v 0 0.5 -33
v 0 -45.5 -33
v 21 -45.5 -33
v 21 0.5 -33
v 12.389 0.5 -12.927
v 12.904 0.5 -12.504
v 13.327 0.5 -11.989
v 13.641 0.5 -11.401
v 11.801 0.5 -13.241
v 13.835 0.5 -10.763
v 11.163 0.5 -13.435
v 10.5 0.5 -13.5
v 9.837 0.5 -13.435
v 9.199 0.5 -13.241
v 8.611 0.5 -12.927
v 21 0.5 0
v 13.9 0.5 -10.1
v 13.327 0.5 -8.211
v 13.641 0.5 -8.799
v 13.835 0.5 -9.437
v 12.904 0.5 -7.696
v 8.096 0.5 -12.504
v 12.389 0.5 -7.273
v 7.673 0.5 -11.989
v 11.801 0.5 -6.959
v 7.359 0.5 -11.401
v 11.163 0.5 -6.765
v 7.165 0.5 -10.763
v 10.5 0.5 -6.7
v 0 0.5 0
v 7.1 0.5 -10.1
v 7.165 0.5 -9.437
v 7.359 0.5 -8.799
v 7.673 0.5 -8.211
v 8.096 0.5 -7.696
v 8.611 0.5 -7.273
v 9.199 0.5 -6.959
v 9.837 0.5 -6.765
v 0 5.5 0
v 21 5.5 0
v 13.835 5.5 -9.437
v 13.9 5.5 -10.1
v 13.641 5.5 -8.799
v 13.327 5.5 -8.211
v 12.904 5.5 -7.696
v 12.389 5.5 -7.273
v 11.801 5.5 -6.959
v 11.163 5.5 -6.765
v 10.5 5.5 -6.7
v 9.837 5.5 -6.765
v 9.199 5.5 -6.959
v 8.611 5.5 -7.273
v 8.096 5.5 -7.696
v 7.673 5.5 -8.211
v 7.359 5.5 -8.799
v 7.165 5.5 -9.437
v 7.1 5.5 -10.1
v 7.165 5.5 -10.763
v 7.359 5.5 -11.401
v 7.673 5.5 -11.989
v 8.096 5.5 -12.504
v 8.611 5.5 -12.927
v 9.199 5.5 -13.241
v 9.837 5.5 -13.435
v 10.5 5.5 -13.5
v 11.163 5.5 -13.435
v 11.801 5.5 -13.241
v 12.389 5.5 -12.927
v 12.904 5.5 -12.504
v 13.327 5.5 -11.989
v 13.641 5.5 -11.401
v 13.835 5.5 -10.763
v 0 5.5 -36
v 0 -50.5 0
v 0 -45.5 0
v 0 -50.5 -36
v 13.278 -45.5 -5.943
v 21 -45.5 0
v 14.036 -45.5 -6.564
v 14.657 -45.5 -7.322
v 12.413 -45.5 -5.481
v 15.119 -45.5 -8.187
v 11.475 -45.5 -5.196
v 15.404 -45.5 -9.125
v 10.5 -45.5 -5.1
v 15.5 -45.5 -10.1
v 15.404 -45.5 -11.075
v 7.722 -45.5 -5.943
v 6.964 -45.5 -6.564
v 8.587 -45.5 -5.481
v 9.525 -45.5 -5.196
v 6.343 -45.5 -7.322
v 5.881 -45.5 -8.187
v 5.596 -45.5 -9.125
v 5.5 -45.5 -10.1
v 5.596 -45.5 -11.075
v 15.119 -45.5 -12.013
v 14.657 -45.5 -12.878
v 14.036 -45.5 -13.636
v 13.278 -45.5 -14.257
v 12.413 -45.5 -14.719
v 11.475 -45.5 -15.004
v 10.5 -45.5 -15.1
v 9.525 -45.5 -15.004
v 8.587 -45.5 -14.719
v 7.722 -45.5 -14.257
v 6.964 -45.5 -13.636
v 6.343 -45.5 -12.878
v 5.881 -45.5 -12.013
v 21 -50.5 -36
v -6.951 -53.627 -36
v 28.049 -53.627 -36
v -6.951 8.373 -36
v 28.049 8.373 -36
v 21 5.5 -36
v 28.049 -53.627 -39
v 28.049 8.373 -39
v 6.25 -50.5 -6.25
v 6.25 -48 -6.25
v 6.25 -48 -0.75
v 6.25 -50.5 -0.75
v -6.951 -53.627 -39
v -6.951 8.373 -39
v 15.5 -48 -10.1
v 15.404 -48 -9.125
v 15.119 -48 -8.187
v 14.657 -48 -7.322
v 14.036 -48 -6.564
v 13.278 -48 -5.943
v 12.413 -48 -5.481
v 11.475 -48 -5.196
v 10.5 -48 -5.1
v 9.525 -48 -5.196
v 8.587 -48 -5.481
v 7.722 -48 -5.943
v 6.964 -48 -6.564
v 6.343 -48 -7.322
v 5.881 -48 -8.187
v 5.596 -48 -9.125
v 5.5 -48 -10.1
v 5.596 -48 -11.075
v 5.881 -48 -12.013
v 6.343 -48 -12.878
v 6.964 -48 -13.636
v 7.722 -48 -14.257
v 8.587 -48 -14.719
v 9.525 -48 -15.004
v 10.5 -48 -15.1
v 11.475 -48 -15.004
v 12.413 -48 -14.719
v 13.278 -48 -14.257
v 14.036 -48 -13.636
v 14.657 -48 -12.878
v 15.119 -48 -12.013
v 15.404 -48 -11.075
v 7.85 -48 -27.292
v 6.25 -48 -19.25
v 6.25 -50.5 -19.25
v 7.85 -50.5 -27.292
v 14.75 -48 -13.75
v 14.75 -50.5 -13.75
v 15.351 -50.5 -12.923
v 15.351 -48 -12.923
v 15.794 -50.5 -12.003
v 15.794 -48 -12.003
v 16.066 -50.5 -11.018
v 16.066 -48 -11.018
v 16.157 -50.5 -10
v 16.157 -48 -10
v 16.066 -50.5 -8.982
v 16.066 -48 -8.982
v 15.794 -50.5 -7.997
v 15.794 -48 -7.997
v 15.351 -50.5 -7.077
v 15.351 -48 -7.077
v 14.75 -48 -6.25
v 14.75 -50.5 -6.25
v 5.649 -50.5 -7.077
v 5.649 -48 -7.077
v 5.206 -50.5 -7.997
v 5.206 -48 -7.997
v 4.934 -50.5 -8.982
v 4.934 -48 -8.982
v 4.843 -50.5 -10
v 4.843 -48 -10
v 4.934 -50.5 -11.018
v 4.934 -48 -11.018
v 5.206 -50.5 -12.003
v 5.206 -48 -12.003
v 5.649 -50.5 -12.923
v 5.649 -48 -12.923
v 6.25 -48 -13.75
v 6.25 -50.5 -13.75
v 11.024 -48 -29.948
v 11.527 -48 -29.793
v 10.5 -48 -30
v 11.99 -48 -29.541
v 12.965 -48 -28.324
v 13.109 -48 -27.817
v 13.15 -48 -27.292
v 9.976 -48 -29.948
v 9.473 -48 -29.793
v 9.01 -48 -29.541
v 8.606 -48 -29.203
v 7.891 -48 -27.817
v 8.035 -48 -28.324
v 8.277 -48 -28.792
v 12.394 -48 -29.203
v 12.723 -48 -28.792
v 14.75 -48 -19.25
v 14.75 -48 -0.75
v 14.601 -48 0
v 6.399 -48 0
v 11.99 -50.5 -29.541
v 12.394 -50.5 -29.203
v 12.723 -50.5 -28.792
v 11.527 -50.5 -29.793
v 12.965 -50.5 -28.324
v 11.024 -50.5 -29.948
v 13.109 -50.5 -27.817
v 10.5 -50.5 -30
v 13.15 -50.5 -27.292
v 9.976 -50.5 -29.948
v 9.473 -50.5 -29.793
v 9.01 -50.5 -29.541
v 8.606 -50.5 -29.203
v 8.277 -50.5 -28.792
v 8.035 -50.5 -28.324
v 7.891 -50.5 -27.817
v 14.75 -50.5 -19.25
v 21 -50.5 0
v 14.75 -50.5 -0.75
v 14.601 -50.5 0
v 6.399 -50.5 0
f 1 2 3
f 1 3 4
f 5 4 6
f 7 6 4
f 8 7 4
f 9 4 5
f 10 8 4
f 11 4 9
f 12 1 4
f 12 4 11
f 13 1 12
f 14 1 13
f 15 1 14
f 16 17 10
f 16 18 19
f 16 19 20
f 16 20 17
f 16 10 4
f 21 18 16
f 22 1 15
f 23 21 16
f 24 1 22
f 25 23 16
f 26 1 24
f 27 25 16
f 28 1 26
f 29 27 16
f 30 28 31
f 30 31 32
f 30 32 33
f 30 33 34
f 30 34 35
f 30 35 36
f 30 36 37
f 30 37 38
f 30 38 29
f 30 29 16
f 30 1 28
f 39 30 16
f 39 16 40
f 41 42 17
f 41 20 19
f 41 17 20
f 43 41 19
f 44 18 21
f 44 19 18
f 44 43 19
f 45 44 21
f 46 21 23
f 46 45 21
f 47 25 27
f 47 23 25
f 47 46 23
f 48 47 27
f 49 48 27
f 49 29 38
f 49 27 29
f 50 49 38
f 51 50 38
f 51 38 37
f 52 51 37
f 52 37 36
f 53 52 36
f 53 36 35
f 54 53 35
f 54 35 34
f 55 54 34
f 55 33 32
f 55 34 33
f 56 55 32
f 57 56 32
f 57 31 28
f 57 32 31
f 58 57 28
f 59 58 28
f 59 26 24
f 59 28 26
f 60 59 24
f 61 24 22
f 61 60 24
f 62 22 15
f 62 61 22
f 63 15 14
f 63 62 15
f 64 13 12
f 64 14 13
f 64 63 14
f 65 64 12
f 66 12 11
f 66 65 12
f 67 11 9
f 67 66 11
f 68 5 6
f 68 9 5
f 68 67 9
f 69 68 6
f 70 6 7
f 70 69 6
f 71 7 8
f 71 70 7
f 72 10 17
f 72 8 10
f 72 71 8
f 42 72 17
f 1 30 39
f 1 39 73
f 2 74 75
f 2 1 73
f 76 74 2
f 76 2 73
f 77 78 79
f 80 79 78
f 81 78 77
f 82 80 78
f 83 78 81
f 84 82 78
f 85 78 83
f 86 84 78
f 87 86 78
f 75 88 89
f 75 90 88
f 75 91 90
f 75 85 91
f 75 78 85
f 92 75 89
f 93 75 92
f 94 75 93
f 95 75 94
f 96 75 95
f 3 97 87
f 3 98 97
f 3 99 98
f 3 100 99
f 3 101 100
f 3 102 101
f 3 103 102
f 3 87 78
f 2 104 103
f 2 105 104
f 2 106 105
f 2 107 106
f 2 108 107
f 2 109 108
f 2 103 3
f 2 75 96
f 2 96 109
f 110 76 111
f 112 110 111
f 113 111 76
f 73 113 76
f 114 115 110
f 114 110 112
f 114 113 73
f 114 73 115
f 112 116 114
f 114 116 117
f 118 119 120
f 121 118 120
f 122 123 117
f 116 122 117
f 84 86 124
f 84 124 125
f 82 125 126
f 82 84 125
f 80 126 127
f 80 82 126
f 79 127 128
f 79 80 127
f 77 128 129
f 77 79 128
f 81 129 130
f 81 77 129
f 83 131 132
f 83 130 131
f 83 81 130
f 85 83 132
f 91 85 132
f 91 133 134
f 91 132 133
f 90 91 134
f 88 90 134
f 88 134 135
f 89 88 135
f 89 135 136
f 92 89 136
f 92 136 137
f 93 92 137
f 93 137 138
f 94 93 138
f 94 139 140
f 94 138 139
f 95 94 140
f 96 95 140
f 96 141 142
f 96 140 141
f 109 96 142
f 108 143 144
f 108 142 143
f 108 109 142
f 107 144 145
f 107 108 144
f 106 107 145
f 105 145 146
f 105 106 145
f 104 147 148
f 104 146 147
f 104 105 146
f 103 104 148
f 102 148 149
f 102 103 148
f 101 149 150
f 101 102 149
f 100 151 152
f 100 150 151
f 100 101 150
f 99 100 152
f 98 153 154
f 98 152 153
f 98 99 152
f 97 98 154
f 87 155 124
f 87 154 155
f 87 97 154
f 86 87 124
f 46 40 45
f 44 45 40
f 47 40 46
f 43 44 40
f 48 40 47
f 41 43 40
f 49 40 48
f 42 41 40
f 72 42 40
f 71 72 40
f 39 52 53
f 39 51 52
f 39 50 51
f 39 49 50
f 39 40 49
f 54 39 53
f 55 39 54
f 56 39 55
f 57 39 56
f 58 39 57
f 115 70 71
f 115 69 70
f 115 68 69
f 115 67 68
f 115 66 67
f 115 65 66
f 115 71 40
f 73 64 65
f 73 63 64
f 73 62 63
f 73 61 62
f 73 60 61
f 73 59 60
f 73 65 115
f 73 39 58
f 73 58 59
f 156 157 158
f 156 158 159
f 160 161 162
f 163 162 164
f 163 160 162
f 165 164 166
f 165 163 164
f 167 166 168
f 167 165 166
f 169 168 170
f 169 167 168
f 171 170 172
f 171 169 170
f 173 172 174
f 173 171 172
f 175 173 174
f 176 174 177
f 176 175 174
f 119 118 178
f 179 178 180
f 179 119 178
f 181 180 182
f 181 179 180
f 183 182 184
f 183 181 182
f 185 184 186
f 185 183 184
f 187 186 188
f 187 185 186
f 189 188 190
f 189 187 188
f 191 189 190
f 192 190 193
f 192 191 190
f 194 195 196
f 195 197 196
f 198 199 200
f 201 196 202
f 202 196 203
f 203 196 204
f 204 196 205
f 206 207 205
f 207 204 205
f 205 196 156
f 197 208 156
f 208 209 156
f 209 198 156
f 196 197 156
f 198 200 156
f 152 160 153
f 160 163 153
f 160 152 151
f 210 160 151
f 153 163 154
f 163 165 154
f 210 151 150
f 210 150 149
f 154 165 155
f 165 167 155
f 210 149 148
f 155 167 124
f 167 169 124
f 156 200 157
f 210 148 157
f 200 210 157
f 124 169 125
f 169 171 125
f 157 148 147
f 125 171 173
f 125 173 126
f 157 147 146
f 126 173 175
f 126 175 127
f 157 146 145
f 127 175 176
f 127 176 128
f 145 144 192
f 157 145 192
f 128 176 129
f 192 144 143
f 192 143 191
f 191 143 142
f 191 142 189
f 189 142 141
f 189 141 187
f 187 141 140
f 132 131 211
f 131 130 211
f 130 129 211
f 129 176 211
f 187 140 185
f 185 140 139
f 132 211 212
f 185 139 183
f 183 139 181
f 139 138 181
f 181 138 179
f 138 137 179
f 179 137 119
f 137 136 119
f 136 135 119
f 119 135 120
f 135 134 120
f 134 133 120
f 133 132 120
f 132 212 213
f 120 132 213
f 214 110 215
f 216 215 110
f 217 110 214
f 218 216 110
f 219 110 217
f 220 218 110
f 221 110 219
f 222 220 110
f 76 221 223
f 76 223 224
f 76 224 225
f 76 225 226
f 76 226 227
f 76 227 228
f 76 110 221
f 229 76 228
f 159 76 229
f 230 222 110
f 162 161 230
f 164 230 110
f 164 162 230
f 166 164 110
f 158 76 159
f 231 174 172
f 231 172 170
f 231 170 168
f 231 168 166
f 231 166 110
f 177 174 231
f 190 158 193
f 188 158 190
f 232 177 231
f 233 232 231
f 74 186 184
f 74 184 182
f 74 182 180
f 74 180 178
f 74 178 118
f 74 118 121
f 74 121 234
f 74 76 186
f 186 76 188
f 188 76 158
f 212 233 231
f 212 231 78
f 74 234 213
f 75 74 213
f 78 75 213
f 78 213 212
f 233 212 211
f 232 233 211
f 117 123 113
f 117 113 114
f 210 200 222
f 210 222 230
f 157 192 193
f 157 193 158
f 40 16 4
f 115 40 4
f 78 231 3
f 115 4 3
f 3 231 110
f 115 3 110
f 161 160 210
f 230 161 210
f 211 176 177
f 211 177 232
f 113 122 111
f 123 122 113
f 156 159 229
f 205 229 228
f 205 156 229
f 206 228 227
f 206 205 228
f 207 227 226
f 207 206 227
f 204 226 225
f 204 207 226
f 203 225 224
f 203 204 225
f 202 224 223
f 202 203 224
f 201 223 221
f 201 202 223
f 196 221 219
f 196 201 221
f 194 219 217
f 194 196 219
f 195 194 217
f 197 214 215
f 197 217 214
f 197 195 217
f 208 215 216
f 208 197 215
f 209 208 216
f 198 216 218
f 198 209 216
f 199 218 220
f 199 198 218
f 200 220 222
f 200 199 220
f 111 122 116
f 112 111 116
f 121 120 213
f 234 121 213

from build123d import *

# Parameters (mm, degrees)
CYLINDER053_R          = 3.4
CYLINDER053_DEPTH      = 44
CYLINDER052_R          = 5
CYLINDER052_DEPTH      = 9
PAD019_DEPTH           = 5
PAD018_DEPTH           = 21
CUT028_PLACEMENT_ANGLE = 90
SKETCH020_W            = 35
SKETCH020_H            = 62
PAD020_DEPTH           = 3


with BuildPart() as cylinder053:
    # Cylinder053 → Cylinder053 (new body)
    with BuildSketch(Plane(origin=(10.5, -10.1, -9), x_dir=(1, 0, 0), z_dir=(0, 0, 1))):
        Circle(CYLINDER053_R)
    extrude(amount=CYLINDER053_DEPTH)


with BuildPart() as cylinder052:
    # Cylinder052 → Cylinder052 (new body)
    with BuildSketch(Plane(origin=(10.5, -10.1, 44), x_dir=(1, 0, 0), z_dir=(0, 0, 1))):
        Circle(CYLINDER052_R)
    extrude(amount=CYLINDER052_DEPTH)


with BuildPart() as fusion043:
    # Sketch019 → Pad019 (new body)
    with BuildSketch(Plane.XY):
        with BuildLine():
            Line((-4.25, 3.75), (-4.25, 9.25))
            Line((-4.25, 9.25), (-2.65, 17.292388))
            ThreePointArc((2.65, 17.292388), (0, 20), (-2.65, 17.292388))
            Line((2.65, 17.292388), (4.25, 9.25))
            Line((4.25, 3.75), (4.25, 9.25))
            ThreePointArc((4.25, -3.75), (5.657274, 0), (4.25, 3.75))
            Line((4.25, -3.75), (4.25, -9.25))
            Line((2.65, -17.292388), (4.25, -9.25))
            ThreePointArc((-2.65, -17.292388), (0, -20), (2.65, -17.292388))
            Line((-4.25, -9.25), (-2.65, -17.292388))
            Line((-4.25, -3.75), (-4.25, -9.25))
            ThreePointArc((-4.25, 3.75), (-5.657274, 0), (-4.25, -3.75))
        make_face()
    extrude(amount=PAD019_DEPTH)


with BuildPart() as fusion043_1:
    # Body019 placement: moved
    add(fusion043.part.moved(Location((10.5, -10, 48))))

    # Fusion043: union Cylinder052
    add(cylinder052.part)


with BuildPart() as agarre004:
    # Sketch018 → Pad018 (new body)
    with BuildSketch(Plane.YZ):
        Polygon((-33, -0.5), (0, -0.5), (0, -5.5), (-38, -5.5), (-38, 50.5), (0, 50.5), (0, 45.5), (-33, 45.5), align=None)
    extrude(amount=PAD018_DEPTH)

    # Cut027: cut Fusion043
    add(fusion043_1.part, mode=Mode.SUBTRACT)

    # Cut028: cut Cylinder053
    add(cylinder053.part, mode=Mode.SUBTRACT)


with BuildPart() as agarre004_1:
    # Cut028 placement: moved
    add(agarre004.part.rotate(Axis((0, 0, 0), (1, 0, 0)), CUT028_PLACEMENT_ANGLE))


with BuildPart() as fusion044:
    # Sketch020 → Pad020 (new body)
    with BuildSketch(Plane.XY):
        with Locations((10.548899, -22.627238)):
            Rectangle(SKETCH020_W, SKETCH020_H)
    extrude(amount=PAD020_DEPTH)


with BuildPart() as fusion044_1:
    # Body020 placement: moved
    add(fusion044.part.moved(Location((0, 0, -39))))

    # Fusion044: union Agarre004
    add(agarre004_1.part)


solid = fusion044_1.part
